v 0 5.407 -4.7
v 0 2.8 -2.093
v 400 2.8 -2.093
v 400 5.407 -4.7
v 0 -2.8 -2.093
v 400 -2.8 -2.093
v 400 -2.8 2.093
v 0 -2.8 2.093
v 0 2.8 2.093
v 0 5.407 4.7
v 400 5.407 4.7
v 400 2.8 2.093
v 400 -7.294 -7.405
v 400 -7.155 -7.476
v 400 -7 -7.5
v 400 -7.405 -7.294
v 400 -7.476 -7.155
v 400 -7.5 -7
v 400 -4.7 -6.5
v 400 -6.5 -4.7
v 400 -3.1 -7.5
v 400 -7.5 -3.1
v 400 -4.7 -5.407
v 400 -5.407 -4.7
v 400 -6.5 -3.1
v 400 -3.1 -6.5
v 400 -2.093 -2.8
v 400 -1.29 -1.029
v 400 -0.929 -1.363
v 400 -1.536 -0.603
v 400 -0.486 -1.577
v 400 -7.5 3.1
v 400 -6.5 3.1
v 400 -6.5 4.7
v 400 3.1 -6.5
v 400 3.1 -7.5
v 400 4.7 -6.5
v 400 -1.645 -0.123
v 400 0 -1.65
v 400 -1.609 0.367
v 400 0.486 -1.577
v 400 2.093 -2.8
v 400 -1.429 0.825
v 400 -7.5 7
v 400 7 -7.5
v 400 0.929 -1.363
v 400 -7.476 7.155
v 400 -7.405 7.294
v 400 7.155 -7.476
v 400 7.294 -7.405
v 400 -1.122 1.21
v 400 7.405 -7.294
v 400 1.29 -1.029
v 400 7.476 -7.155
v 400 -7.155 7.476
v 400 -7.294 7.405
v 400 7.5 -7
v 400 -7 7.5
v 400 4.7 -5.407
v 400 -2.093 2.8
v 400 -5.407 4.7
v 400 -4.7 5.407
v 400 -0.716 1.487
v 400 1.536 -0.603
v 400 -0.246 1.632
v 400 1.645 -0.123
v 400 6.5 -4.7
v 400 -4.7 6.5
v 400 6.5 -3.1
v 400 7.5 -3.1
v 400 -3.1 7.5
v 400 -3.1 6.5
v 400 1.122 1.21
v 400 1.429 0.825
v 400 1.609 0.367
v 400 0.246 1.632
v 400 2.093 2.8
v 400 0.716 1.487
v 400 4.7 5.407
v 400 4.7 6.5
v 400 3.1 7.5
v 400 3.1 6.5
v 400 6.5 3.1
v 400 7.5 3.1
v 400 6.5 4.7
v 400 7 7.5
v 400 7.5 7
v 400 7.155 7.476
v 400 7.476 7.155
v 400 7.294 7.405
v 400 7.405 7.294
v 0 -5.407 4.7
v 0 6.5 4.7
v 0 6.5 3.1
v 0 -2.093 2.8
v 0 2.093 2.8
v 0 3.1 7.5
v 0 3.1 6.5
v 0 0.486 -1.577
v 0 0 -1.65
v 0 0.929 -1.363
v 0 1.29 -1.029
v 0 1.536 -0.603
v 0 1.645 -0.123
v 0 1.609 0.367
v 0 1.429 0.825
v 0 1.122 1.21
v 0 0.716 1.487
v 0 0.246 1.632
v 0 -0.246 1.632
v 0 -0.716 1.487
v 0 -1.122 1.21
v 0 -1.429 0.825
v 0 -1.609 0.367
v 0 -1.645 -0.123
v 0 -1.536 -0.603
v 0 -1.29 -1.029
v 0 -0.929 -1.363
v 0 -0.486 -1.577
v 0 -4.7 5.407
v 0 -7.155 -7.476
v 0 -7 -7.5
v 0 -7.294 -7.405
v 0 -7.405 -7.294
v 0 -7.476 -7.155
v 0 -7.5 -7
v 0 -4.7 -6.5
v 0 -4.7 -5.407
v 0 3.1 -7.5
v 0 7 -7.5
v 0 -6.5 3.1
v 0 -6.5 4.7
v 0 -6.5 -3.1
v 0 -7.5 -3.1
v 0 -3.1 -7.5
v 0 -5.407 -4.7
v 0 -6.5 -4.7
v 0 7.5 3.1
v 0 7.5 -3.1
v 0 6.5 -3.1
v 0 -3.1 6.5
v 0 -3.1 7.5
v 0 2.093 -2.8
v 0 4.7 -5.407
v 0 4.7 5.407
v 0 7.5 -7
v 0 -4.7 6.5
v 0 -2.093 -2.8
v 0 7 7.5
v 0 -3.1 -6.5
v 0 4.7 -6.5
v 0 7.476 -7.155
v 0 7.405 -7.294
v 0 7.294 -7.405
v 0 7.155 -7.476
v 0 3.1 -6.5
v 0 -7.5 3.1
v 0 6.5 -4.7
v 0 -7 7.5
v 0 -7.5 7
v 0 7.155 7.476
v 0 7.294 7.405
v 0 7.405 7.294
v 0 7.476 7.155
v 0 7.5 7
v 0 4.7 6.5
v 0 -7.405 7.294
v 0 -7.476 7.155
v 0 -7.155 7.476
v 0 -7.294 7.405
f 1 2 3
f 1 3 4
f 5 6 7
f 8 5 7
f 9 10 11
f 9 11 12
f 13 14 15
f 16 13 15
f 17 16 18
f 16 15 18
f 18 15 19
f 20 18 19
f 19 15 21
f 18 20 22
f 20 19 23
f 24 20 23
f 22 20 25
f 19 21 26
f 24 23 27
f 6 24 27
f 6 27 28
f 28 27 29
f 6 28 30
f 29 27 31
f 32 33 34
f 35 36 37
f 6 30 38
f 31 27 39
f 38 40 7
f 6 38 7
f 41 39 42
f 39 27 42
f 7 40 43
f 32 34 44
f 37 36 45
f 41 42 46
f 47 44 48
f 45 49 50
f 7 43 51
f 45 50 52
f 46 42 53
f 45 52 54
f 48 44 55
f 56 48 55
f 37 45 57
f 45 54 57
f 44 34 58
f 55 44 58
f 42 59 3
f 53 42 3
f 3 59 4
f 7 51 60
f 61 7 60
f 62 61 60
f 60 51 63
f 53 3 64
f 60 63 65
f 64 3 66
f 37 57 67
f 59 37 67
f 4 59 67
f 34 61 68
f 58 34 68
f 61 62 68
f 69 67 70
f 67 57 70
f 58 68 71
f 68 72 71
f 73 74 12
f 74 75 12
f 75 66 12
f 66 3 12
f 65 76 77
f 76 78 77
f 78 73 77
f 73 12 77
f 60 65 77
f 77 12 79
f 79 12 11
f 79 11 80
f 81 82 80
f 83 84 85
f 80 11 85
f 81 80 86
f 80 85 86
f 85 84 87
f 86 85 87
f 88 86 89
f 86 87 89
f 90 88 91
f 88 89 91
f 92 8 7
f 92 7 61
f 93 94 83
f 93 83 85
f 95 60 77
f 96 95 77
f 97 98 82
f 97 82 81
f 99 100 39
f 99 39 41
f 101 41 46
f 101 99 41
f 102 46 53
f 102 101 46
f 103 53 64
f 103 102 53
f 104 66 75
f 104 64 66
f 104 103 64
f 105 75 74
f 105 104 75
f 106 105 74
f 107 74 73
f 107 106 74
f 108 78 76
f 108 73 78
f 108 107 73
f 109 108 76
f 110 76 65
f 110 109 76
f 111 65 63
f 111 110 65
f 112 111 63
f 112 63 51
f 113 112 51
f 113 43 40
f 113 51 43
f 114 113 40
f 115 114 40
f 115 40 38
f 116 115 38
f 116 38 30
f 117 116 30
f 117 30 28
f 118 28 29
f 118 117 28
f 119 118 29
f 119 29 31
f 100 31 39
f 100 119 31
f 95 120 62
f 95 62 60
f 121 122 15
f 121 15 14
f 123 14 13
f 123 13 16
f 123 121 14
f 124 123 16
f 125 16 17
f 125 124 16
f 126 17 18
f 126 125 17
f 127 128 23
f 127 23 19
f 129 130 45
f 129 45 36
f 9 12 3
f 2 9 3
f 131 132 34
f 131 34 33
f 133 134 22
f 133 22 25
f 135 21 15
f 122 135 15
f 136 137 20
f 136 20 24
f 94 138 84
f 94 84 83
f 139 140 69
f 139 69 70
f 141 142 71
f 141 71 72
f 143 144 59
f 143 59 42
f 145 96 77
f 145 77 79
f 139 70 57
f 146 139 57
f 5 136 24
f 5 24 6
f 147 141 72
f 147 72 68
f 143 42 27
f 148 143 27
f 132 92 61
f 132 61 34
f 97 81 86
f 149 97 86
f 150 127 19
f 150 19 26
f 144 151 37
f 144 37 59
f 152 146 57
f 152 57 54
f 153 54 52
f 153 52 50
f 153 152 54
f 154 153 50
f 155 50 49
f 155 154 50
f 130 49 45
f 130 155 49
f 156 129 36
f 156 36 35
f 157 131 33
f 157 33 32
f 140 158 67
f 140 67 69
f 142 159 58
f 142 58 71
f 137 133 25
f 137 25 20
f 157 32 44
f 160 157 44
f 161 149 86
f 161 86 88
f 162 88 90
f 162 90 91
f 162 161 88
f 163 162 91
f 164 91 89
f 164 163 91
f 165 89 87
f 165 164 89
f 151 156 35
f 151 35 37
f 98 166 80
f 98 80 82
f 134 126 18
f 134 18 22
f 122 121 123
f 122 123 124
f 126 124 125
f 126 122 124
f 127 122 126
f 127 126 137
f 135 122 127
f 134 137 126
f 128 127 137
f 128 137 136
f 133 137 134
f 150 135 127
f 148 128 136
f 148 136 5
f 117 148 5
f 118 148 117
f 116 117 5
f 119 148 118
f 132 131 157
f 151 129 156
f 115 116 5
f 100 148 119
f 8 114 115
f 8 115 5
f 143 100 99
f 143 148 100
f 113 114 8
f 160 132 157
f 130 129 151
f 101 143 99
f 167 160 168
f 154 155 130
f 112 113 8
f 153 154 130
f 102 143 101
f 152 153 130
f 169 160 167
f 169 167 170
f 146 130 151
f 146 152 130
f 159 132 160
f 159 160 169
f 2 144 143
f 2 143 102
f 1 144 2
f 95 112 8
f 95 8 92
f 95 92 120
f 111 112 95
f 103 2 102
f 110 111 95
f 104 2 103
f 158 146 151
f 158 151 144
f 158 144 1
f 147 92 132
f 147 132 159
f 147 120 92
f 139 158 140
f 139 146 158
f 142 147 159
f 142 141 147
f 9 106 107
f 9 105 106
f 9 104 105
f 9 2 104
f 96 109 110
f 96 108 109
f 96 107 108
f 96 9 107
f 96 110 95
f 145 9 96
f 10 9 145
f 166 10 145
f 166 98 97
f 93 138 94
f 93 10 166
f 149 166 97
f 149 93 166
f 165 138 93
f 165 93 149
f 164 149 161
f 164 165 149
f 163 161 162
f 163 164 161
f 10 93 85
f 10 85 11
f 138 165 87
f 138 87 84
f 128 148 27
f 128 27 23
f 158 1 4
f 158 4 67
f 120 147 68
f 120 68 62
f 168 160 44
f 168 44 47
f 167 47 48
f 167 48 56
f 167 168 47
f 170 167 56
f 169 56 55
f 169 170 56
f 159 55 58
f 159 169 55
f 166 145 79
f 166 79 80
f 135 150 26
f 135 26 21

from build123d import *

# Parameters (mm, degrees)
EXTRUDE_1_DEPTH          = 400
CUT_EXTRUDE_2_DEPTH      = 401.140600289
CUT_EXTRUDE_2_DEPTH_BACK = 401.140600289
SKETCH_2_4_R             = 1.65


with BuildPart() as part:
    # 草图2 → 凸台-拉伸1 (new body)
    with BuildSketch(Plane(origin=(0, 0, 0), x_dir=(0, 0, -1), z_dir=(1, 0, 0))):
        with BuildLine():
            Line((-7, 7.5), (7, 7.5))
            ThreePointArc((7, 7.5), (7.353553391, 7.353553391), (7.5, 7))
            Line((7.5, 7), (7.5, -7))
            ThreePointArc((7.5, -7), (7.353553391, -7.353553391), (7, -7.5))
            Line((7, -7.5), (-7, -7.5))
            ThreePointArc((-7, -7.5), (-7.353553391, -7.353553391), (-7.5, -7))
            Line((-7.5, -7), (-7.5, 7))
            ThreePointArc((-7.5, 7), (-7.353553391, 7.353553391), (-7, 7.5))
        make_face()
    extrude(amount=EXTRUDE_1_DEPTH)

    # 草图2<4> → 切除-拉伸2 (cut, two sides: drawn at the far end of the back side and taken through both)
    with BuildSketch(Plane(origin=(0, 0, 0), x_dir=(0, 0, -1), z_dir=(1, 0, 0)).offset(-CUT_EXTRUDE_2_DEPTH_BACK)):
        Polygon((3.1, 7.5), (-3.1, 7.5), (-3.1, 6.5), (-4.7, 6.5), (-4.7, 5.407106781), (-2.092893219, 2.8), (2.092893219, 2.8), (4.7, 5.407106781), (4.7, 6.5), (3.1, 6.5), align=None)
        Polygon((-6.5, 3.1), (-7.5, 3.1), (-7.5, -3.1), (-6.5, -3.1), (-6.5, -4.7), (-5.407106781, -4.7), (-2.8, -2.092893219), (-2.8, 2.092893219), (-5.407106781, 4.7), (-6.5, 4.7), align=None)
        Polygon((7.5, -3.1), (7.5, 3.1), (6.5, 3.1), (6.5, 4.7), (5.407106781, 4.7), (2.8, 2.092893219), (2.8, -2.092893219), (5.407106781, -4.7), (6.5, -4.7), (6.5, -3.1), align=None)
        Polygon((-3.1, -6.5), (-3.1, -7.5), (3.1, -7.5), (3.1, -6.5), (4.7, -6.5), (4.7, -5.407106781), (2.092893219, -2.8), (-2.092893219, -2.8), (-4.7, -5.407106781), (-4.7, -6.5), align=None)
        Circle(SKETCH_2_4_R)
    extrude(amount=CUT_EXTRUDE_2_DEPTH + CUT_EXTRUDE_2_DEPTH_BACK, mode=Mode.SUBTRACT)


solid = part.part
